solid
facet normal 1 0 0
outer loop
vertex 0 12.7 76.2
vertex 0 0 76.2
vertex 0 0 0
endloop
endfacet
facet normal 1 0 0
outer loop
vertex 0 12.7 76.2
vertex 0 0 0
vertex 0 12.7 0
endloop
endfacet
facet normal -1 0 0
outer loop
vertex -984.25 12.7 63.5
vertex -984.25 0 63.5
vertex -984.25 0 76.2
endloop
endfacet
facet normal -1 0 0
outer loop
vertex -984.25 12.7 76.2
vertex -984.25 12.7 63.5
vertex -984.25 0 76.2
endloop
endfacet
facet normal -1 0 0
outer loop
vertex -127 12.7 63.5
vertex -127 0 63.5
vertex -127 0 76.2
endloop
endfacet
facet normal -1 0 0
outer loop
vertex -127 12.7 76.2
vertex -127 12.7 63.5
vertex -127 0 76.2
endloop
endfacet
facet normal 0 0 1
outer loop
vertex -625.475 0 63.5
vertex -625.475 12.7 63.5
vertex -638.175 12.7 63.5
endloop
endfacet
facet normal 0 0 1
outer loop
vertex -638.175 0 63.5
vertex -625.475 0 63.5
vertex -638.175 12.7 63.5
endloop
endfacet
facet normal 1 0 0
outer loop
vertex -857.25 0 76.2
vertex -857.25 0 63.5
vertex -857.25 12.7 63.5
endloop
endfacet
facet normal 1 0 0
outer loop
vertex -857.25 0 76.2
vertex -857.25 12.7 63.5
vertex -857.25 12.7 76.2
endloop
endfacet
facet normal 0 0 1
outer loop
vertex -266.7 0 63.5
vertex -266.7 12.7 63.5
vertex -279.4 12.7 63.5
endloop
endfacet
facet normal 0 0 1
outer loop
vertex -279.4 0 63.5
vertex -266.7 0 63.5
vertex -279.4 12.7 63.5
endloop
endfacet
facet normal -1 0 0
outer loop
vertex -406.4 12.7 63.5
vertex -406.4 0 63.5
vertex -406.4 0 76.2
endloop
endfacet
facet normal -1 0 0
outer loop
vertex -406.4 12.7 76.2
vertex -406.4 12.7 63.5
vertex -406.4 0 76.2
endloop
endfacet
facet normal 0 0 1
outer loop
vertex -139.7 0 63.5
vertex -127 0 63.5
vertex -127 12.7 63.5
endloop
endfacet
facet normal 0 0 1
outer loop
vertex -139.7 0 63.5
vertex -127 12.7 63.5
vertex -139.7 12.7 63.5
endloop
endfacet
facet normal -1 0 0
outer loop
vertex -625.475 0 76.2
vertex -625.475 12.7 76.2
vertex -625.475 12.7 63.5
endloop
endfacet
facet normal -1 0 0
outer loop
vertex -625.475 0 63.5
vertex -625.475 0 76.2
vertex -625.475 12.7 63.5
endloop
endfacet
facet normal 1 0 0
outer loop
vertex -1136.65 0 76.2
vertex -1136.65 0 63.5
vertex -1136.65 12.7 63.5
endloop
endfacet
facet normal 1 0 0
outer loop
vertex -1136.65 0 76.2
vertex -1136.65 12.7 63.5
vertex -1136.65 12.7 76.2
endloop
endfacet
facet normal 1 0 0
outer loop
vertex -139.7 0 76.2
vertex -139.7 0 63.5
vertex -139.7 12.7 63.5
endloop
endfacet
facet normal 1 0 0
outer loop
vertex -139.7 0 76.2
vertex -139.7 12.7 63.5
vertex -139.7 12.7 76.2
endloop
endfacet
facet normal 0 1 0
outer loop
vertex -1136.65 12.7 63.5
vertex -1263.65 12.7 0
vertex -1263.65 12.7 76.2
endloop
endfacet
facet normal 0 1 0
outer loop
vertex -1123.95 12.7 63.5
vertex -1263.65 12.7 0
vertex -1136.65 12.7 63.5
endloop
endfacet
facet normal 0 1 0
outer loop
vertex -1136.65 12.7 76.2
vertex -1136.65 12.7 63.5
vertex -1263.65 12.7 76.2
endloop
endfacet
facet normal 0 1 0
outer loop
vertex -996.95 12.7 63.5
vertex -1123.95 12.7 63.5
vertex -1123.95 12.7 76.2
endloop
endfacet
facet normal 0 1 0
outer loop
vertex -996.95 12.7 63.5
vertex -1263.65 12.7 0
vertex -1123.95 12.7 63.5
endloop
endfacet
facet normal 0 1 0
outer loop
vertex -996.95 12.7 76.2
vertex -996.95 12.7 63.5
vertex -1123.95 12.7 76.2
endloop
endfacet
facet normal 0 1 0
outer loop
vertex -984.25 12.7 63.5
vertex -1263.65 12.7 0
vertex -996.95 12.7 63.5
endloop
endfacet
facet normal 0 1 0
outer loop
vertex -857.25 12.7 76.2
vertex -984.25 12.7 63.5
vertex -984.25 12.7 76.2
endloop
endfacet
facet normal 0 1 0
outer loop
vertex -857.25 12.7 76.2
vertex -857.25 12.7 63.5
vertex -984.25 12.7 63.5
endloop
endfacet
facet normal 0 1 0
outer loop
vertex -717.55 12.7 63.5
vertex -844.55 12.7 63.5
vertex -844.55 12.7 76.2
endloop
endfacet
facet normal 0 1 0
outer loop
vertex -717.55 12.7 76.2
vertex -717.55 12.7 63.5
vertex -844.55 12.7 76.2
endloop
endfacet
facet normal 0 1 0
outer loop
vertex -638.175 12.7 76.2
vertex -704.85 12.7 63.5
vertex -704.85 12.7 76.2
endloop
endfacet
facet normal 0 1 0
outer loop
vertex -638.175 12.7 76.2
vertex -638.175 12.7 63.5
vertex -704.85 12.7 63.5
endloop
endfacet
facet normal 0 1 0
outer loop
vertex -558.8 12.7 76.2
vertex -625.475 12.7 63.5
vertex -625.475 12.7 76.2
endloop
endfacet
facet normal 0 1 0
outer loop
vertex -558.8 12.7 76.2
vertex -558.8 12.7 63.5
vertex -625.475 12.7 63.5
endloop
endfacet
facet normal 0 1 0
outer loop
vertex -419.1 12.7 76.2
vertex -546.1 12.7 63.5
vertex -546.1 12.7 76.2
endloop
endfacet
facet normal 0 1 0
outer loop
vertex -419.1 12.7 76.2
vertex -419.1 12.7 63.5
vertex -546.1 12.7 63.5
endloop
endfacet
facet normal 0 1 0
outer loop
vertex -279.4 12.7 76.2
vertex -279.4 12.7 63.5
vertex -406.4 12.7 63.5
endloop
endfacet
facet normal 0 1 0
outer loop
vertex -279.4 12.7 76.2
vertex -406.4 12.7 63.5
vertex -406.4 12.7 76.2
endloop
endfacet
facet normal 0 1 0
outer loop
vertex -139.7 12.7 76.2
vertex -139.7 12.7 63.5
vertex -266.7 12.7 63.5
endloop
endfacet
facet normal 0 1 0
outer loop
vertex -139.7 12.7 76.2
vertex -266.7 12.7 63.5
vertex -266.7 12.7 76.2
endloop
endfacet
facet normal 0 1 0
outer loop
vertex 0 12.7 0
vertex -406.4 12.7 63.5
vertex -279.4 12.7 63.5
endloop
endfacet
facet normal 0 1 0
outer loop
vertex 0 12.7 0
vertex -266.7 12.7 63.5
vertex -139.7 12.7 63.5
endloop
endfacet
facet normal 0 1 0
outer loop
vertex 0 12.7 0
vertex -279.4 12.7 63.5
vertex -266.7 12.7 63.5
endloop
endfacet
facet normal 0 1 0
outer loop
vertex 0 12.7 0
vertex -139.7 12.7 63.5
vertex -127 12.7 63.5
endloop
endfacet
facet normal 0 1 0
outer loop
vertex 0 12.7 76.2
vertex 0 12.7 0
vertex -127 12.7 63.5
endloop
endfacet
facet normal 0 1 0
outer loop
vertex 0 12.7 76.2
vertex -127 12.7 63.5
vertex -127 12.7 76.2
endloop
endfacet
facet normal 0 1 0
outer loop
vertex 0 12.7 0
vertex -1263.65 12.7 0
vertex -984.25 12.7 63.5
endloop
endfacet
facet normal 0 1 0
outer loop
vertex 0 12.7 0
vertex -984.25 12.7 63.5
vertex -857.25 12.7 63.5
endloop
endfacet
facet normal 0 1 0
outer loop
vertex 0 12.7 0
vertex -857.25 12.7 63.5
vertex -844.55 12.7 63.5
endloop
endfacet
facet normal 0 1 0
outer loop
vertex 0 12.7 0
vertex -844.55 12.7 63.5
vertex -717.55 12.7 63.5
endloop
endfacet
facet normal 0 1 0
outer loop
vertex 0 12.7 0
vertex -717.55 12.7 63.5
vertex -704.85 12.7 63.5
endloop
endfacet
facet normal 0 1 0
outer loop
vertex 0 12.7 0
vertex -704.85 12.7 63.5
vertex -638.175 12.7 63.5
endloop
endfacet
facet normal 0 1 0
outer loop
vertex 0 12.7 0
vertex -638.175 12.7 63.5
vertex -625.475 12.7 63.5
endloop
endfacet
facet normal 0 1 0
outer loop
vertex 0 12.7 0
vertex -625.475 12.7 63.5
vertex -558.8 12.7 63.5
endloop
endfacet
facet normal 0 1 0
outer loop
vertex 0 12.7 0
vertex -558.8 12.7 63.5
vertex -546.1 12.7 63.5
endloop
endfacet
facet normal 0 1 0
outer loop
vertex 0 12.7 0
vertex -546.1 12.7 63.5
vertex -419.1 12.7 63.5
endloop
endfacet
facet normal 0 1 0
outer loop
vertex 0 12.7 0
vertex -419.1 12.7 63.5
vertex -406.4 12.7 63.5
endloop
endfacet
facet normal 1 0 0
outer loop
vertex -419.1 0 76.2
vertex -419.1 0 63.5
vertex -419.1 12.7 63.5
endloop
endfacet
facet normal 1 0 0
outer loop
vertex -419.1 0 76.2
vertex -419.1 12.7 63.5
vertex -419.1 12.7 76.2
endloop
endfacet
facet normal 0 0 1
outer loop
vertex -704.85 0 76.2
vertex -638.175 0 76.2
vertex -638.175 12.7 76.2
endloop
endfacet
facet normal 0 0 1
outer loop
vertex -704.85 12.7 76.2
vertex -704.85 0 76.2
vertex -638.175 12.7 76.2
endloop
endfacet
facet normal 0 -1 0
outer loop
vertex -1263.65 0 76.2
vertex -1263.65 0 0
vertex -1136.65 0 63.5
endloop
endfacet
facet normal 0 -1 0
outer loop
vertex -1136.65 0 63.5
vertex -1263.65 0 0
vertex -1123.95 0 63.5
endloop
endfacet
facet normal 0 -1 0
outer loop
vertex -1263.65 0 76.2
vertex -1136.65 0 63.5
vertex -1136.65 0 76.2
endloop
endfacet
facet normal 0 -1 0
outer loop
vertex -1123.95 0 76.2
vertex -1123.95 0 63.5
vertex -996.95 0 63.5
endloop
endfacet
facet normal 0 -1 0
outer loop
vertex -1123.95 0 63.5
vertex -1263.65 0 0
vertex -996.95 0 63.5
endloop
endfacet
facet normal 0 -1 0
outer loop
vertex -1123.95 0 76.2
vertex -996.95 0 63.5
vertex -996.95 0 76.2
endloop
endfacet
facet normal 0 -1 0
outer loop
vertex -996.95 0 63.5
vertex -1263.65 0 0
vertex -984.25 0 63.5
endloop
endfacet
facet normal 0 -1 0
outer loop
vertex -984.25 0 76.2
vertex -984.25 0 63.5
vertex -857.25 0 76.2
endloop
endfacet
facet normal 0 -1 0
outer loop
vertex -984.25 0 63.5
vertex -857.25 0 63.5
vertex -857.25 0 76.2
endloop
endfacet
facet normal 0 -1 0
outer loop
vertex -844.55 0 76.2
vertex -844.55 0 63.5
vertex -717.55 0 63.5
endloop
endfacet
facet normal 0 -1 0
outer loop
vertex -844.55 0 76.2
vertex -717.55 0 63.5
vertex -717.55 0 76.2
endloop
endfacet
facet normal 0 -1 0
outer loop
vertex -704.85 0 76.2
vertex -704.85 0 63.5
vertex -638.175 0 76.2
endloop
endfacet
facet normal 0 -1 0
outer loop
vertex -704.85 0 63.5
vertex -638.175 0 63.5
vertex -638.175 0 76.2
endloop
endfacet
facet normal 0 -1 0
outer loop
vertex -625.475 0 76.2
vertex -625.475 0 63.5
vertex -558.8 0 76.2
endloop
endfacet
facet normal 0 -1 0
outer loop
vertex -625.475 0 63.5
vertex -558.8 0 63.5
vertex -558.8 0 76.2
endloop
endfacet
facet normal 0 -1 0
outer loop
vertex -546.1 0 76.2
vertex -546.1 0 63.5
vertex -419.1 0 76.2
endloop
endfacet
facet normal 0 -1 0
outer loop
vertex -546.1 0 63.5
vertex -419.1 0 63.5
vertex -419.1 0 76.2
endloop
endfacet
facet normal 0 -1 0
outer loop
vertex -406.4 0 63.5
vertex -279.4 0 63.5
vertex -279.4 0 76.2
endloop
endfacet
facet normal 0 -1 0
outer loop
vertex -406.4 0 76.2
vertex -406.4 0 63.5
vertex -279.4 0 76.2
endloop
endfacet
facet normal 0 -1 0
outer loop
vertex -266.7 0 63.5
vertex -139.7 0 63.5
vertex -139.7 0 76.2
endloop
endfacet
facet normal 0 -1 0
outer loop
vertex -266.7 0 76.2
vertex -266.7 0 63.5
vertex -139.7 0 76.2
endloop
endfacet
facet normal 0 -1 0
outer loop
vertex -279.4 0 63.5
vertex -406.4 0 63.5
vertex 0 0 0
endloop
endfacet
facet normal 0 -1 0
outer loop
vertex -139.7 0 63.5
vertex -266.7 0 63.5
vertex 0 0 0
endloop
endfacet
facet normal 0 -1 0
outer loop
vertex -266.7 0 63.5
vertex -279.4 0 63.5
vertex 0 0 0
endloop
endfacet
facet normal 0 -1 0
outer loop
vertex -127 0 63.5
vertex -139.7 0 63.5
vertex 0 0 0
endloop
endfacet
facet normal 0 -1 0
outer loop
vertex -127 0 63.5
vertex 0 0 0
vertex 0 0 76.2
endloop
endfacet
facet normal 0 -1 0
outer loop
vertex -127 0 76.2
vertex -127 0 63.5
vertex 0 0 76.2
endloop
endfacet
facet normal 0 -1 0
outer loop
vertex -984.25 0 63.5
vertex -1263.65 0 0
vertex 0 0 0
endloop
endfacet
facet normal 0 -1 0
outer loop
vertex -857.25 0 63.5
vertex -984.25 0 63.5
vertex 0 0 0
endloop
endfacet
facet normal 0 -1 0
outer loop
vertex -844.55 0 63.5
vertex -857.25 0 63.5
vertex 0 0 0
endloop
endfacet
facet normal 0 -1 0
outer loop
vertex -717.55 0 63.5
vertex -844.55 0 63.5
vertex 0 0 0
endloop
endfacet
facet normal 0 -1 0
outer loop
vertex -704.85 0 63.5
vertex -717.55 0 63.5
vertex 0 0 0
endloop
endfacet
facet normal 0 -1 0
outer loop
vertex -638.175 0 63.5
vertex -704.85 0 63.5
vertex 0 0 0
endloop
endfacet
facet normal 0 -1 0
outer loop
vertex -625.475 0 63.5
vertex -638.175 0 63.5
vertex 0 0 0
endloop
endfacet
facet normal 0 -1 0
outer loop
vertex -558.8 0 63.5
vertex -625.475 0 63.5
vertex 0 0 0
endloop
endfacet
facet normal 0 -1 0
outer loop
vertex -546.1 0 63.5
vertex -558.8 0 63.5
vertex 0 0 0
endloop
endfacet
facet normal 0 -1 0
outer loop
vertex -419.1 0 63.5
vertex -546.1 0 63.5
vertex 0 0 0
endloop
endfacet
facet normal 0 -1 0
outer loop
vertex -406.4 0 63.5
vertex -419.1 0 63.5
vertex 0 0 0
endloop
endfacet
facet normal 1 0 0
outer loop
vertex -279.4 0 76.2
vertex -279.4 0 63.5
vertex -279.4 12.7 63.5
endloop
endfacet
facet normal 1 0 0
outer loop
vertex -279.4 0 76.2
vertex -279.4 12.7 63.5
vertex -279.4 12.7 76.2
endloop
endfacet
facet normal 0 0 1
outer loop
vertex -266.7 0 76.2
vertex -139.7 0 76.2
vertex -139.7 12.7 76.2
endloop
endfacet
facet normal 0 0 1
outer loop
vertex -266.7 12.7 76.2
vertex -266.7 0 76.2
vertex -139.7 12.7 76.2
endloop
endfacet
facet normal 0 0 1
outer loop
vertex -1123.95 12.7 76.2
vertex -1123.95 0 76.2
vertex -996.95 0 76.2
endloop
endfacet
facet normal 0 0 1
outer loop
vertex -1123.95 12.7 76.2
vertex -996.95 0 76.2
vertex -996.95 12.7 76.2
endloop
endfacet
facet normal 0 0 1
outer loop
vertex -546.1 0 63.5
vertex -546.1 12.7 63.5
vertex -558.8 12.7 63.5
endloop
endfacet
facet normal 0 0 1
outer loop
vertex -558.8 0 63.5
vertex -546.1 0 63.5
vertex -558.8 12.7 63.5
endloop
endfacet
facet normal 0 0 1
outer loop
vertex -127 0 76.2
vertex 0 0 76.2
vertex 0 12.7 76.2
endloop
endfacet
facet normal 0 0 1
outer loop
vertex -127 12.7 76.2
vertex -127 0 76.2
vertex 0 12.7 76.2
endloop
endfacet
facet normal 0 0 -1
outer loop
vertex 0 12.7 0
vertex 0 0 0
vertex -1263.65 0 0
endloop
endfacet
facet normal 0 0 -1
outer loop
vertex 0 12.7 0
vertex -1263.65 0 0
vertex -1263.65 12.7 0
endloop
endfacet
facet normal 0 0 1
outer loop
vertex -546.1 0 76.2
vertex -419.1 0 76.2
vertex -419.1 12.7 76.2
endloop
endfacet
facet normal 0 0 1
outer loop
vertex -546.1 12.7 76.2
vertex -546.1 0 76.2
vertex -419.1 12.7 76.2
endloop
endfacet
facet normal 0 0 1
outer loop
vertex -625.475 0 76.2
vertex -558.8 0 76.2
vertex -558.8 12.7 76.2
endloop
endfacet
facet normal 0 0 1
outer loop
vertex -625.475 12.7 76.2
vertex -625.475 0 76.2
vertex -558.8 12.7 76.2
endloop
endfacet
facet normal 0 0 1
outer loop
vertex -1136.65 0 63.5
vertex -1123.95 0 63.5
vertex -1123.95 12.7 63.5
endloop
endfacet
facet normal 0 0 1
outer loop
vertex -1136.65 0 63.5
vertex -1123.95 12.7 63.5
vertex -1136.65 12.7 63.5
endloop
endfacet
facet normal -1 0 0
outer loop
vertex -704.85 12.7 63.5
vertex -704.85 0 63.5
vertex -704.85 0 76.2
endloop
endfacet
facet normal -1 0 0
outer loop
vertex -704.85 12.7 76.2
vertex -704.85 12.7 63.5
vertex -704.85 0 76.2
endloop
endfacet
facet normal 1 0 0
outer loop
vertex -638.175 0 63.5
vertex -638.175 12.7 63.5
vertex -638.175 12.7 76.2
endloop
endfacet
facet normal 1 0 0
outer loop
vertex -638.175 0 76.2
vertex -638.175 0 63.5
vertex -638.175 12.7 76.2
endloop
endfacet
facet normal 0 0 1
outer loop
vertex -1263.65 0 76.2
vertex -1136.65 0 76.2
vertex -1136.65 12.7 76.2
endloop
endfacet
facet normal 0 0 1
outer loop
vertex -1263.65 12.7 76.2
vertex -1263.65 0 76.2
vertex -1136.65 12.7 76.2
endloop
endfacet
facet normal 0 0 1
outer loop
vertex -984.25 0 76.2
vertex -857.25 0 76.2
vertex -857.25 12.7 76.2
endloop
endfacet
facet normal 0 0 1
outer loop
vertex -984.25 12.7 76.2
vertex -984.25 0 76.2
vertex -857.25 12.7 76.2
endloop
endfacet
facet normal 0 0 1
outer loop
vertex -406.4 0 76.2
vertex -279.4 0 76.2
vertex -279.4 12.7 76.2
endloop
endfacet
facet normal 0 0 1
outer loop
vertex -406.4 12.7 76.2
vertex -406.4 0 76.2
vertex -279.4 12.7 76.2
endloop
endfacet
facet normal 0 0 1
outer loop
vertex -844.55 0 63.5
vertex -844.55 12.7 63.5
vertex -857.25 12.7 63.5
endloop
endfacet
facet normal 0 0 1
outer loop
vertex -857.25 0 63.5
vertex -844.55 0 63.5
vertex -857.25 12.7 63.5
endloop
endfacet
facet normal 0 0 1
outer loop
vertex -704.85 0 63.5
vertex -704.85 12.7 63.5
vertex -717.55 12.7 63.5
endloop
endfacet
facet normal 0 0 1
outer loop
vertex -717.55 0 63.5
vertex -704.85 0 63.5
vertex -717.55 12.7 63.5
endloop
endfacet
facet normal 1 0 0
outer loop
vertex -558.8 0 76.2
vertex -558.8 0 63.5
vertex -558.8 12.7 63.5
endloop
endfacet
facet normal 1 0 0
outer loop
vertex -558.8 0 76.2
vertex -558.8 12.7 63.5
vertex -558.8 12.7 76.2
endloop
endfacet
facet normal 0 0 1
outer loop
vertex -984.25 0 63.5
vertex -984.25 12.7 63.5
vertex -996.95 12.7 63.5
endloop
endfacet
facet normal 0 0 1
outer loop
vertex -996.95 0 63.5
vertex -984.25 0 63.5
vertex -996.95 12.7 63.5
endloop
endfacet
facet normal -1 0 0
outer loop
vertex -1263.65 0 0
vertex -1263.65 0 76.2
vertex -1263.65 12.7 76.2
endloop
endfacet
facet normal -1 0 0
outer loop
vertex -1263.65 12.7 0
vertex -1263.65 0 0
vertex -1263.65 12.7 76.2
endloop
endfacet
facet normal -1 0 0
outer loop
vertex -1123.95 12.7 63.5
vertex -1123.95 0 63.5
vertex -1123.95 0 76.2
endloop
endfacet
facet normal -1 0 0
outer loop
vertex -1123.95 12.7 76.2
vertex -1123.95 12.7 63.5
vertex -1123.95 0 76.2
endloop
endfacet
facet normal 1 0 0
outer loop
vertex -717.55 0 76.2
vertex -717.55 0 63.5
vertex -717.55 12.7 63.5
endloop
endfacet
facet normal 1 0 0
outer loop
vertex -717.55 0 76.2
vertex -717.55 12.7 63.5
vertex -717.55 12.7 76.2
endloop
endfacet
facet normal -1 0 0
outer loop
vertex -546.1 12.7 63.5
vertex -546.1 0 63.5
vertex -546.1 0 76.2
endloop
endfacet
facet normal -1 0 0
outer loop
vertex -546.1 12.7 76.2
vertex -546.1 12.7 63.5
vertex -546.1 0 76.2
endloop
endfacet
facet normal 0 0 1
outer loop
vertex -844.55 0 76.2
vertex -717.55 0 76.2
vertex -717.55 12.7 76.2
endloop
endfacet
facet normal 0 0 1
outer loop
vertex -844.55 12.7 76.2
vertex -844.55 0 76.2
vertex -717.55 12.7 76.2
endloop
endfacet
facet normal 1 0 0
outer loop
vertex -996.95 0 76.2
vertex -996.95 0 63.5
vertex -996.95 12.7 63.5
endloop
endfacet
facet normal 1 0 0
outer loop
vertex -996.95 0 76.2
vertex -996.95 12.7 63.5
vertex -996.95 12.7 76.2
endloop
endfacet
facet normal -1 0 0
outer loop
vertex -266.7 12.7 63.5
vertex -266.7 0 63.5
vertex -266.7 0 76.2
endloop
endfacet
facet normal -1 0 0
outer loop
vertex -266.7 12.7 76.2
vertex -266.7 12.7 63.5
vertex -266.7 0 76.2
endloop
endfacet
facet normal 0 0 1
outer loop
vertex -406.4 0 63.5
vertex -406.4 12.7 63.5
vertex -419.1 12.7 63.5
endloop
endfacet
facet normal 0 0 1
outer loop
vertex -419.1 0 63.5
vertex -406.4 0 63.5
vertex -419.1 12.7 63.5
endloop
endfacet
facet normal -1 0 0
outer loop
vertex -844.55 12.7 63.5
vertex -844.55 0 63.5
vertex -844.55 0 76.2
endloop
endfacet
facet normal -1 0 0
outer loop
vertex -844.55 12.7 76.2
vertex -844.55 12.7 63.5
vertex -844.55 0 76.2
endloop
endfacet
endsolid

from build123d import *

# Parameters (mm, degrees)
F0_W     = 12.7
F0_H     = 76.2
F1_DEPTH = 1263.65
F2_W     = 12.7
F2_H     = 12.7
F3_DEPTH = 12.7
F5_DEPTH = 12.7


# Not quite as in the source:
# - a feature names something its author has since deleted; it is built from what else it names


with BuildPart() as f1:
    # F0 (on Right) → F1 (new body)
    with BuildSketch(Plane.YZ):
        with Locations((6.35, 38.1)):
            Rectangle(F0_W, F0_H)
    extrude(amount=-F1_DEPTH)

    # F2 (on face) → F3 (cut)
    with BuildSketch(Plane(origin=(0, 12.7, 0), x_dir=(-1, 0, 0), z_dir=(0, 1, 0))):
        with Locations((133.35, 69.85)):
            Rectangle(F2_W, F2_H)
        with Locations((273.05, 69.85)):
            Rectangle(F2_W, F2_H)
        with Locations((412.75, 69.85)):
            Rectangle(F2_W, F2_H)
        with Locations((552.45, 69.85)):
            Rectangle(F2_W, F2_H)
        with Locations((711.2, 69.85)):
            Rectangle(F2_W, F2_H)
        with Locations((850.9, 69.85)):
            Rectangle(F2_W, F2_H)
        with Locations((990.6, 69.85)):
            Rectangle(F2_W, F2_H)
        with Locations((1130.3, 69.85)):
            Rectangle(F2_W, F2_H)
    extrude(amount=-F3_DEPTH, mode=Mode.SUBTRACT)

    # F4 (on face) → F5 (cut)
    with BuildSketch(Plane(origin=(0, 12.7, 0), x_dir=(-1, 0, 0), z_dir=(0, 1, 0))):
        Polygon((631.825, 76.2), (625.475, 76.2), (625.475, 63.5), (638.175, 63.5), (638.175, 76.2), align=None)
    extrude(amount=-F5_DEPTH, mode=Mode.SUBTRACT)


solid = f1.part
